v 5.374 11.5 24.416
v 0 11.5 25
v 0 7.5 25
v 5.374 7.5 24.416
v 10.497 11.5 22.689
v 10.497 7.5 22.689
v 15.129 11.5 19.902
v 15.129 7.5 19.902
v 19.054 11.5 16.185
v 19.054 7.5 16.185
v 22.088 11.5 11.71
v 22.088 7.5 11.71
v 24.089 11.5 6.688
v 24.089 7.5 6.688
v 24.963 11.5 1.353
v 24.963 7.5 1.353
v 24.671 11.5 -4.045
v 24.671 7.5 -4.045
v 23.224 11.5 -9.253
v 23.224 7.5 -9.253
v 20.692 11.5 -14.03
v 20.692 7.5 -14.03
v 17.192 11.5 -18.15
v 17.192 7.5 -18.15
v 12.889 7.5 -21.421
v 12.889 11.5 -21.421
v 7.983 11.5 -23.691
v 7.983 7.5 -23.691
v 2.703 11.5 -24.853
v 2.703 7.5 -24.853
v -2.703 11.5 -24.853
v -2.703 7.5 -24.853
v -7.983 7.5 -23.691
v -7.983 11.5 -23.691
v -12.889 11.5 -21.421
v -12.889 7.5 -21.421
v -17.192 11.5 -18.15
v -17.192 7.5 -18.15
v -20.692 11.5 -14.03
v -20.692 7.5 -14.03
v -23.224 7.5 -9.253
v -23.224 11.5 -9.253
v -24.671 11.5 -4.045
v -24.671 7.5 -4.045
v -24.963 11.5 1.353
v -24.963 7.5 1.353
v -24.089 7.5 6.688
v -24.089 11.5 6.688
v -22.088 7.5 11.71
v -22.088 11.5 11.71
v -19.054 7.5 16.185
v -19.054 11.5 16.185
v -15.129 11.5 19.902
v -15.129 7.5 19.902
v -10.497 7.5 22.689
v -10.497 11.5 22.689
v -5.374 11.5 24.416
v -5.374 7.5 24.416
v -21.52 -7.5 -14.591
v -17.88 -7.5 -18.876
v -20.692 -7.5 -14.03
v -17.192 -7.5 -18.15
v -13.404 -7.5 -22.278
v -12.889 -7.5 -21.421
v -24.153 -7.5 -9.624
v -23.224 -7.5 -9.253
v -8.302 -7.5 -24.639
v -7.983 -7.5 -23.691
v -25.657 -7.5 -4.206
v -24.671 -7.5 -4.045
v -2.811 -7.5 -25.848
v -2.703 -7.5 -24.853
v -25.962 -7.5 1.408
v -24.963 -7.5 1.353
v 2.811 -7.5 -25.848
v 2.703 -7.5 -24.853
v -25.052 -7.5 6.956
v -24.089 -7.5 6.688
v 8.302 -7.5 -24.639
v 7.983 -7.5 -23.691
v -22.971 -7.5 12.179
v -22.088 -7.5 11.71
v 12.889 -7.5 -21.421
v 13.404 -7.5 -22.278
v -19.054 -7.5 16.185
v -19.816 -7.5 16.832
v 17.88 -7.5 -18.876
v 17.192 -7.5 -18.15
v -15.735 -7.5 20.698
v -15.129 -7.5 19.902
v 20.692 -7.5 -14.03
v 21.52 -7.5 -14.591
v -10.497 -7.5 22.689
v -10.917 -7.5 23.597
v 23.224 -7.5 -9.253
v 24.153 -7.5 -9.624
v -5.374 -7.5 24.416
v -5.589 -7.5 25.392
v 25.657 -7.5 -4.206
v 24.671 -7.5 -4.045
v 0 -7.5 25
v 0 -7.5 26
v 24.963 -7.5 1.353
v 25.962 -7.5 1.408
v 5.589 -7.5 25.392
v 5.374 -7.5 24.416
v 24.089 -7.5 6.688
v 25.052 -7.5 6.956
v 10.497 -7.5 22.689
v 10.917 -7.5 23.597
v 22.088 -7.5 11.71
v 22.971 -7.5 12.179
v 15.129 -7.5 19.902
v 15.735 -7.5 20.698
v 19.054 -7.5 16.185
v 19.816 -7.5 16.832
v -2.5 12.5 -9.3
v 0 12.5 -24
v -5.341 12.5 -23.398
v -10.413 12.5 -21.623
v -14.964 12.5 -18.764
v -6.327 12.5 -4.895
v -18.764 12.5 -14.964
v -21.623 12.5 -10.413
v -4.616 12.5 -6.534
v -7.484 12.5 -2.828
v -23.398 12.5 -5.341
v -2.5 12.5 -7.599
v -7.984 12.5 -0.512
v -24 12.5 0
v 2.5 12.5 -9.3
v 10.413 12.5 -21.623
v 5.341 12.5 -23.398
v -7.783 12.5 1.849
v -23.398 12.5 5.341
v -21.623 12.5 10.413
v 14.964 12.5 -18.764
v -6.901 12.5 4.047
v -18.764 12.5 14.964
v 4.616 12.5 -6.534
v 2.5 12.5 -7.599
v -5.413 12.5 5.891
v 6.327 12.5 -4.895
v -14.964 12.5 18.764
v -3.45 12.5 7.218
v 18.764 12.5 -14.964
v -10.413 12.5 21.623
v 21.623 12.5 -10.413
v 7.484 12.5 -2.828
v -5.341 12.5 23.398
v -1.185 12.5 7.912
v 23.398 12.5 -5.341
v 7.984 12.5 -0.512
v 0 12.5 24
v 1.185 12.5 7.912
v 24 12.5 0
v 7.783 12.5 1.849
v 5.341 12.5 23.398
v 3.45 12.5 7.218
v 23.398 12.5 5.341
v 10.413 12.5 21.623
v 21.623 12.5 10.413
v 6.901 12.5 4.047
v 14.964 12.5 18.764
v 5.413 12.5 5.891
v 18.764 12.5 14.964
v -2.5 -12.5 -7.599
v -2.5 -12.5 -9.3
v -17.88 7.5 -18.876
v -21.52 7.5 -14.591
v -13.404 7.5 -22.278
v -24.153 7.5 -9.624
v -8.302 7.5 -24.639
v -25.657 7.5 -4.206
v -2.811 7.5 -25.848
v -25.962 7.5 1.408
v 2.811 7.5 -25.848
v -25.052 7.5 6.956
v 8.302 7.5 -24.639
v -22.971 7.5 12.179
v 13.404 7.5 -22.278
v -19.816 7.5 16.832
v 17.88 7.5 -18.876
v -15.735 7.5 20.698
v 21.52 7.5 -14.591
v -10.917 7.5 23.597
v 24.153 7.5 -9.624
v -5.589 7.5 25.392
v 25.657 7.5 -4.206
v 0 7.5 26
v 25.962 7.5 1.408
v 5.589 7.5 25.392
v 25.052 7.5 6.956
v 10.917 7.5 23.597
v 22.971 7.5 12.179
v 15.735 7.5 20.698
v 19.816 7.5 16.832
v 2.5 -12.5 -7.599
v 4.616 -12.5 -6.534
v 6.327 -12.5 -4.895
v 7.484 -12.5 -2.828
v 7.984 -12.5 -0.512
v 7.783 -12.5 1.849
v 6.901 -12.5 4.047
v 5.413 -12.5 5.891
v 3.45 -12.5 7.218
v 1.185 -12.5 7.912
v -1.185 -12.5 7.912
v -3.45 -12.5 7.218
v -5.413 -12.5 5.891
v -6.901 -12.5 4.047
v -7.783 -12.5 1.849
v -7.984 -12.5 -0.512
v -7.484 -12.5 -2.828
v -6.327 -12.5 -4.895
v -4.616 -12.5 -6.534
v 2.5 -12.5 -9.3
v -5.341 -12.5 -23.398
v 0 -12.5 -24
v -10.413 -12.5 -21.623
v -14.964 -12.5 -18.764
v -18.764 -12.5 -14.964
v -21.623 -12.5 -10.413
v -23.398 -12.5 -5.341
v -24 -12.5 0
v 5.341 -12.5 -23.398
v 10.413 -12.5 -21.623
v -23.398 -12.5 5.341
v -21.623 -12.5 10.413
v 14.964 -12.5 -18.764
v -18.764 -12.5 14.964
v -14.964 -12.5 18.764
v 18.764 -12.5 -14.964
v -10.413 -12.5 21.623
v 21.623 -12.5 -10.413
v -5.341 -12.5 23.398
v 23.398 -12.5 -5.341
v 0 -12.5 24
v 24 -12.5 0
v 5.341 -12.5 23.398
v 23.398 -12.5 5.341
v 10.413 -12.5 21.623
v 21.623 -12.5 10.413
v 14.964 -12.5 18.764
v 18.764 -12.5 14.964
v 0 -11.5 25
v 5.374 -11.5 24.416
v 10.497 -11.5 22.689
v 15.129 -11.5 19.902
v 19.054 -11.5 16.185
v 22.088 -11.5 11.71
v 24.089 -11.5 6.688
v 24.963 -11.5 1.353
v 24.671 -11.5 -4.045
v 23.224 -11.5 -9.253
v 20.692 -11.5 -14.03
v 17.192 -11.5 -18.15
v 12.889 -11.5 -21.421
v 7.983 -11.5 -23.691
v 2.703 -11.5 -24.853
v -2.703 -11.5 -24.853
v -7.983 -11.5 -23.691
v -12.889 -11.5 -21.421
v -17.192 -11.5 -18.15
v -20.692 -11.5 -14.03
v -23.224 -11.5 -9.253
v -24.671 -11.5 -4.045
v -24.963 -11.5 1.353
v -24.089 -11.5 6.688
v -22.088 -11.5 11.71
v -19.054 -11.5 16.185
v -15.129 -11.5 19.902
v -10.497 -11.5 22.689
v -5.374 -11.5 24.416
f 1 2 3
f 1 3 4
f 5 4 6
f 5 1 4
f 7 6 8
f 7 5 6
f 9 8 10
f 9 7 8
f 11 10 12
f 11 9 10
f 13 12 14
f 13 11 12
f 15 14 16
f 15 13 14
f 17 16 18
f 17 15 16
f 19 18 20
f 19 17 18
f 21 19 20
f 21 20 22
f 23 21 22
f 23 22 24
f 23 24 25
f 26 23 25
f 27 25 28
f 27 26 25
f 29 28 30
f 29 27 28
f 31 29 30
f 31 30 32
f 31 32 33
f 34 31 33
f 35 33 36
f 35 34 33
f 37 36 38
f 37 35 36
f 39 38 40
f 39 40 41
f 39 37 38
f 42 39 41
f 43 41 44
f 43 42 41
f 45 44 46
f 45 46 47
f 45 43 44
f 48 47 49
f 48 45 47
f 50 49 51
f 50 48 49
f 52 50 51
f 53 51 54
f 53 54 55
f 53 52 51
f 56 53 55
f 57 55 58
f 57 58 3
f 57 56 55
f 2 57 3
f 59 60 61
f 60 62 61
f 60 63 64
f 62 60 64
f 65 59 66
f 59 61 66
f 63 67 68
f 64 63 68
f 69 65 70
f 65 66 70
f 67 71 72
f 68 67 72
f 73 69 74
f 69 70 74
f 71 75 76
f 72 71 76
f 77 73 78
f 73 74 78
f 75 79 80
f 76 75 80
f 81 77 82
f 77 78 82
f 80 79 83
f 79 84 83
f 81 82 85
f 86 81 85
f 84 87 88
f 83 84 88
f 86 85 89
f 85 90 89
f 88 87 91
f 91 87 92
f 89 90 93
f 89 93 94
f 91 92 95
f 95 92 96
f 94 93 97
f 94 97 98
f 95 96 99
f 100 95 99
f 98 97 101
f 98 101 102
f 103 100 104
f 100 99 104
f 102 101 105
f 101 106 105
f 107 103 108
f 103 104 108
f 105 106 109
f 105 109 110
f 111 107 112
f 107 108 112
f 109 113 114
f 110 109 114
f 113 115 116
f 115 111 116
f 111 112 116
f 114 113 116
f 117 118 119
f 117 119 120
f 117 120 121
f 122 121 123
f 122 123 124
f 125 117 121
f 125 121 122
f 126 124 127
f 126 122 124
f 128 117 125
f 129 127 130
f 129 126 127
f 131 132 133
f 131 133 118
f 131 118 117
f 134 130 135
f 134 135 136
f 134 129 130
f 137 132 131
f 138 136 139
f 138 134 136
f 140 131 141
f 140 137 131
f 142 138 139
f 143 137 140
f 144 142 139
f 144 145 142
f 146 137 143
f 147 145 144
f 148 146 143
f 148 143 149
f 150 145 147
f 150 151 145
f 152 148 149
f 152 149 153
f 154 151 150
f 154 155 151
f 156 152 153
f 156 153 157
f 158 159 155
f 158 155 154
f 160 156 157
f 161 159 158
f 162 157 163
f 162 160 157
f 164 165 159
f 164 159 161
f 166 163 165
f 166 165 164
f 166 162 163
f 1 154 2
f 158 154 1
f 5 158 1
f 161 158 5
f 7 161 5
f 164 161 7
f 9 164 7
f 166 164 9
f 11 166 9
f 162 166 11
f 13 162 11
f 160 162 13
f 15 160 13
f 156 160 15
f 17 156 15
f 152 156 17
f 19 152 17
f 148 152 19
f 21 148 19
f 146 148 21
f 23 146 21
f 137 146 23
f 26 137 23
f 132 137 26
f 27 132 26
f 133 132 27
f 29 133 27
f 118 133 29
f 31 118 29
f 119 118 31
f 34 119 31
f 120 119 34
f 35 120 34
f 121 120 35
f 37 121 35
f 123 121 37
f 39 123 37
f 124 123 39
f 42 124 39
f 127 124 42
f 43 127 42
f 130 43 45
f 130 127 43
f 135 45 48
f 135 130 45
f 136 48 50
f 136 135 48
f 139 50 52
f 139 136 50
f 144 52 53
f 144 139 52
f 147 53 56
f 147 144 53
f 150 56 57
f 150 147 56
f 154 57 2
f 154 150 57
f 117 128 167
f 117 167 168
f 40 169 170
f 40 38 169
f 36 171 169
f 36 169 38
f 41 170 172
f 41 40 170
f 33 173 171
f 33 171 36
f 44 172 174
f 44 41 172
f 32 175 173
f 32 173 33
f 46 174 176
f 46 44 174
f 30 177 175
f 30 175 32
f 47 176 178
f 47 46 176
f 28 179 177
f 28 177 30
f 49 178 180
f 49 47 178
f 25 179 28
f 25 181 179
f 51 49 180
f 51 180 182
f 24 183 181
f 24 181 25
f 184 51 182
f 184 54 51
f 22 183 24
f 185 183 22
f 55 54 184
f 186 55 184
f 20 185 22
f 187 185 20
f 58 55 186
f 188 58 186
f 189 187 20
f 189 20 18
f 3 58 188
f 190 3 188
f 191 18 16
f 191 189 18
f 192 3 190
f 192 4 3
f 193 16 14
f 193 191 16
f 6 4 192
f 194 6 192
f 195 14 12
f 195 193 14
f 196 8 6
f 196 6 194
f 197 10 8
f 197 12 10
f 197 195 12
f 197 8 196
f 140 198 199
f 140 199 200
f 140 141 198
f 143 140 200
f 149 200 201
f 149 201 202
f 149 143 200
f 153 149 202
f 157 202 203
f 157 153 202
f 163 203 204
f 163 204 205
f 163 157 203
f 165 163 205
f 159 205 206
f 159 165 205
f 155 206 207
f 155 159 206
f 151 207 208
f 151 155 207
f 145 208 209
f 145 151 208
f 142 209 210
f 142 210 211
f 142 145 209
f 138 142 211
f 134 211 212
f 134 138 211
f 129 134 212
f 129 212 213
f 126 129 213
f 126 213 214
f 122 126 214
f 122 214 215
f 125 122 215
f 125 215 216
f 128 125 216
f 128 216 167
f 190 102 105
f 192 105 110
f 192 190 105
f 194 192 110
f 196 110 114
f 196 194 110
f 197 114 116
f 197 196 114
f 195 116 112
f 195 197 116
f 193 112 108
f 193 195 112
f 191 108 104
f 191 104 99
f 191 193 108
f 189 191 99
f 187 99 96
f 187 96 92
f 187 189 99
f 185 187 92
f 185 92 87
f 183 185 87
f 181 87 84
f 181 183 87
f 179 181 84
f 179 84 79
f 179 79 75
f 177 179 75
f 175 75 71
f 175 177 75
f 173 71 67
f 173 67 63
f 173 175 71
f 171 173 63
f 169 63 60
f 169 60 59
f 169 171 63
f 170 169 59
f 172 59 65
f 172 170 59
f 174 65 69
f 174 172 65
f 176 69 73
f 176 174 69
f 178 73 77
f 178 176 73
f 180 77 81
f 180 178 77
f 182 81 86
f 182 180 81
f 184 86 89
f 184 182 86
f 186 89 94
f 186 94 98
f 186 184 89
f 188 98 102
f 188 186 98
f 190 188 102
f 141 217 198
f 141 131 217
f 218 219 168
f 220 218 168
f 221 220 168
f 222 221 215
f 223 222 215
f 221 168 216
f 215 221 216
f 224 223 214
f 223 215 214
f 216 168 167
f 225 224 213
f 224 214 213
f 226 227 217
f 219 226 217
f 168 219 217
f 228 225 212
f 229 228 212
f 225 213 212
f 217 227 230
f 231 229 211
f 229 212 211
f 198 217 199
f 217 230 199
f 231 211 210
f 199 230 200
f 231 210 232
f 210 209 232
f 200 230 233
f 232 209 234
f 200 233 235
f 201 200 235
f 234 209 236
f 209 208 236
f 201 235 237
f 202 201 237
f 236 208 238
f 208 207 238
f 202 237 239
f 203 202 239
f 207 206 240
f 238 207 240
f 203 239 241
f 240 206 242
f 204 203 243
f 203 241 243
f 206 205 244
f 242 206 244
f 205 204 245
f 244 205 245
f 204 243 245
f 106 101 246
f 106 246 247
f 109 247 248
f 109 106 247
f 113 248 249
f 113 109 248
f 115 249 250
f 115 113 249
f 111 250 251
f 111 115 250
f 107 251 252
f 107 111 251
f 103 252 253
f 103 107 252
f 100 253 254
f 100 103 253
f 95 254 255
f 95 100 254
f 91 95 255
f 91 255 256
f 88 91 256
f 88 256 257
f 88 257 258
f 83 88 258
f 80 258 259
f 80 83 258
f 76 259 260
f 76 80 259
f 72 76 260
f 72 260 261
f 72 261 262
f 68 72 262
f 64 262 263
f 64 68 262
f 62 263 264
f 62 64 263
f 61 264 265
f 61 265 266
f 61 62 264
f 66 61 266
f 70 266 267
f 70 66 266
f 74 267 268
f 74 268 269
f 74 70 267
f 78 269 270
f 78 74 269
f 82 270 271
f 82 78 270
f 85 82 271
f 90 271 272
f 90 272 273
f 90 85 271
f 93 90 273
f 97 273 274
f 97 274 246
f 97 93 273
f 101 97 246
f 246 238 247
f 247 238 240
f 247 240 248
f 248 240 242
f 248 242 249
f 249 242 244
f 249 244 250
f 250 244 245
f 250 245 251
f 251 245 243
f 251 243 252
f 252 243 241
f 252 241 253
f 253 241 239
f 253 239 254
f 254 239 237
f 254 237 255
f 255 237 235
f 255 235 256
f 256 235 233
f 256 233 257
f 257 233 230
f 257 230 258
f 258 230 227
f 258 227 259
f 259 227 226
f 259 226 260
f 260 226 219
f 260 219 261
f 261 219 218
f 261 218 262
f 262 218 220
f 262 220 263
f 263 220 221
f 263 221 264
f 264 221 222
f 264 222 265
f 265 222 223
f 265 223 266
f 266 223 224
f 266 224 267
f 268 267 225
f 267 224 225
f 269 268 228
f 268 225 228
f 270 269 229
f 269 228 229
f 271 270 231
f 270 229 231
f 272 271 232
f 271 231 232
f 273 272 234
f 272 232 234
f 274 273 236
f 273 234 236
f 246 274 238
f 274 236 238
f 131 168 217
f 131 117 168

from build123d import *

# Parameters (mm, degrees)
SKETCH_1_R      = 25
EXTRUDE_1_DEPTH = 12.5
SKETCH_2_R      = 26
SKETCH_2_R_2    = 24
EXTRUDE_2_DEPTH = 7.5
CHAMFER_1_SIZE  = 1


with BuildPart() as part:
    # 草图1 → 凸台-拉伸1 (new, symmetric)
    with BuildSketch(Plane(origin=(0, 0, 0), x_dir=(1, 0, 0), z_dir=(0, 1, 0))):
        with Locations(Location((0, 0, 0), (0, 0, 270))):
            Circle(SKETCH_1_R)
        with BuildLine():
            Line((-2.5, 7.599342077), (-2.5, 9.3))
            Line((-2.5, 9.3), (2.5, 9.3))
            Line((2.5, 9.3), (2.5, 7.599342077))
            ThreePointArc((2.5, 7.599342077), (0, -8), (-2.5, 7.599342077))
        make_face(mode=Mode.SUBTRACT)
    extrude(amount=EXTRUDE_1_DEPTH, both=True)

    # 草图2 → 凸台-拉伸2 (add, symmetric)
    with BuildSketch(Plane(origin=(0, 0, 0), x_dir=(1, 0, 0), z_dir=(0, 1, 0))):
        with Locations(Location((0, 0, 0), (0, 0, 270))):
            Circle(SKETCH_2_R)
        Circle(SKETCH_2_R_2, mode=Mode.SUBTRACT)
    extrude(amount=EXTRUDE_2_DEPTH, both=True)

    # 倒角1
    chamfer_1_edges = [part.edges().sort_by_distance(p)[0] for p in [
        (0, -12.5, -25),
        (0, 12.5, -25),
    ]]
    chamfer(chamfer_1_edges, length=CHAMFER_1_SIZE)


solid = part.part
